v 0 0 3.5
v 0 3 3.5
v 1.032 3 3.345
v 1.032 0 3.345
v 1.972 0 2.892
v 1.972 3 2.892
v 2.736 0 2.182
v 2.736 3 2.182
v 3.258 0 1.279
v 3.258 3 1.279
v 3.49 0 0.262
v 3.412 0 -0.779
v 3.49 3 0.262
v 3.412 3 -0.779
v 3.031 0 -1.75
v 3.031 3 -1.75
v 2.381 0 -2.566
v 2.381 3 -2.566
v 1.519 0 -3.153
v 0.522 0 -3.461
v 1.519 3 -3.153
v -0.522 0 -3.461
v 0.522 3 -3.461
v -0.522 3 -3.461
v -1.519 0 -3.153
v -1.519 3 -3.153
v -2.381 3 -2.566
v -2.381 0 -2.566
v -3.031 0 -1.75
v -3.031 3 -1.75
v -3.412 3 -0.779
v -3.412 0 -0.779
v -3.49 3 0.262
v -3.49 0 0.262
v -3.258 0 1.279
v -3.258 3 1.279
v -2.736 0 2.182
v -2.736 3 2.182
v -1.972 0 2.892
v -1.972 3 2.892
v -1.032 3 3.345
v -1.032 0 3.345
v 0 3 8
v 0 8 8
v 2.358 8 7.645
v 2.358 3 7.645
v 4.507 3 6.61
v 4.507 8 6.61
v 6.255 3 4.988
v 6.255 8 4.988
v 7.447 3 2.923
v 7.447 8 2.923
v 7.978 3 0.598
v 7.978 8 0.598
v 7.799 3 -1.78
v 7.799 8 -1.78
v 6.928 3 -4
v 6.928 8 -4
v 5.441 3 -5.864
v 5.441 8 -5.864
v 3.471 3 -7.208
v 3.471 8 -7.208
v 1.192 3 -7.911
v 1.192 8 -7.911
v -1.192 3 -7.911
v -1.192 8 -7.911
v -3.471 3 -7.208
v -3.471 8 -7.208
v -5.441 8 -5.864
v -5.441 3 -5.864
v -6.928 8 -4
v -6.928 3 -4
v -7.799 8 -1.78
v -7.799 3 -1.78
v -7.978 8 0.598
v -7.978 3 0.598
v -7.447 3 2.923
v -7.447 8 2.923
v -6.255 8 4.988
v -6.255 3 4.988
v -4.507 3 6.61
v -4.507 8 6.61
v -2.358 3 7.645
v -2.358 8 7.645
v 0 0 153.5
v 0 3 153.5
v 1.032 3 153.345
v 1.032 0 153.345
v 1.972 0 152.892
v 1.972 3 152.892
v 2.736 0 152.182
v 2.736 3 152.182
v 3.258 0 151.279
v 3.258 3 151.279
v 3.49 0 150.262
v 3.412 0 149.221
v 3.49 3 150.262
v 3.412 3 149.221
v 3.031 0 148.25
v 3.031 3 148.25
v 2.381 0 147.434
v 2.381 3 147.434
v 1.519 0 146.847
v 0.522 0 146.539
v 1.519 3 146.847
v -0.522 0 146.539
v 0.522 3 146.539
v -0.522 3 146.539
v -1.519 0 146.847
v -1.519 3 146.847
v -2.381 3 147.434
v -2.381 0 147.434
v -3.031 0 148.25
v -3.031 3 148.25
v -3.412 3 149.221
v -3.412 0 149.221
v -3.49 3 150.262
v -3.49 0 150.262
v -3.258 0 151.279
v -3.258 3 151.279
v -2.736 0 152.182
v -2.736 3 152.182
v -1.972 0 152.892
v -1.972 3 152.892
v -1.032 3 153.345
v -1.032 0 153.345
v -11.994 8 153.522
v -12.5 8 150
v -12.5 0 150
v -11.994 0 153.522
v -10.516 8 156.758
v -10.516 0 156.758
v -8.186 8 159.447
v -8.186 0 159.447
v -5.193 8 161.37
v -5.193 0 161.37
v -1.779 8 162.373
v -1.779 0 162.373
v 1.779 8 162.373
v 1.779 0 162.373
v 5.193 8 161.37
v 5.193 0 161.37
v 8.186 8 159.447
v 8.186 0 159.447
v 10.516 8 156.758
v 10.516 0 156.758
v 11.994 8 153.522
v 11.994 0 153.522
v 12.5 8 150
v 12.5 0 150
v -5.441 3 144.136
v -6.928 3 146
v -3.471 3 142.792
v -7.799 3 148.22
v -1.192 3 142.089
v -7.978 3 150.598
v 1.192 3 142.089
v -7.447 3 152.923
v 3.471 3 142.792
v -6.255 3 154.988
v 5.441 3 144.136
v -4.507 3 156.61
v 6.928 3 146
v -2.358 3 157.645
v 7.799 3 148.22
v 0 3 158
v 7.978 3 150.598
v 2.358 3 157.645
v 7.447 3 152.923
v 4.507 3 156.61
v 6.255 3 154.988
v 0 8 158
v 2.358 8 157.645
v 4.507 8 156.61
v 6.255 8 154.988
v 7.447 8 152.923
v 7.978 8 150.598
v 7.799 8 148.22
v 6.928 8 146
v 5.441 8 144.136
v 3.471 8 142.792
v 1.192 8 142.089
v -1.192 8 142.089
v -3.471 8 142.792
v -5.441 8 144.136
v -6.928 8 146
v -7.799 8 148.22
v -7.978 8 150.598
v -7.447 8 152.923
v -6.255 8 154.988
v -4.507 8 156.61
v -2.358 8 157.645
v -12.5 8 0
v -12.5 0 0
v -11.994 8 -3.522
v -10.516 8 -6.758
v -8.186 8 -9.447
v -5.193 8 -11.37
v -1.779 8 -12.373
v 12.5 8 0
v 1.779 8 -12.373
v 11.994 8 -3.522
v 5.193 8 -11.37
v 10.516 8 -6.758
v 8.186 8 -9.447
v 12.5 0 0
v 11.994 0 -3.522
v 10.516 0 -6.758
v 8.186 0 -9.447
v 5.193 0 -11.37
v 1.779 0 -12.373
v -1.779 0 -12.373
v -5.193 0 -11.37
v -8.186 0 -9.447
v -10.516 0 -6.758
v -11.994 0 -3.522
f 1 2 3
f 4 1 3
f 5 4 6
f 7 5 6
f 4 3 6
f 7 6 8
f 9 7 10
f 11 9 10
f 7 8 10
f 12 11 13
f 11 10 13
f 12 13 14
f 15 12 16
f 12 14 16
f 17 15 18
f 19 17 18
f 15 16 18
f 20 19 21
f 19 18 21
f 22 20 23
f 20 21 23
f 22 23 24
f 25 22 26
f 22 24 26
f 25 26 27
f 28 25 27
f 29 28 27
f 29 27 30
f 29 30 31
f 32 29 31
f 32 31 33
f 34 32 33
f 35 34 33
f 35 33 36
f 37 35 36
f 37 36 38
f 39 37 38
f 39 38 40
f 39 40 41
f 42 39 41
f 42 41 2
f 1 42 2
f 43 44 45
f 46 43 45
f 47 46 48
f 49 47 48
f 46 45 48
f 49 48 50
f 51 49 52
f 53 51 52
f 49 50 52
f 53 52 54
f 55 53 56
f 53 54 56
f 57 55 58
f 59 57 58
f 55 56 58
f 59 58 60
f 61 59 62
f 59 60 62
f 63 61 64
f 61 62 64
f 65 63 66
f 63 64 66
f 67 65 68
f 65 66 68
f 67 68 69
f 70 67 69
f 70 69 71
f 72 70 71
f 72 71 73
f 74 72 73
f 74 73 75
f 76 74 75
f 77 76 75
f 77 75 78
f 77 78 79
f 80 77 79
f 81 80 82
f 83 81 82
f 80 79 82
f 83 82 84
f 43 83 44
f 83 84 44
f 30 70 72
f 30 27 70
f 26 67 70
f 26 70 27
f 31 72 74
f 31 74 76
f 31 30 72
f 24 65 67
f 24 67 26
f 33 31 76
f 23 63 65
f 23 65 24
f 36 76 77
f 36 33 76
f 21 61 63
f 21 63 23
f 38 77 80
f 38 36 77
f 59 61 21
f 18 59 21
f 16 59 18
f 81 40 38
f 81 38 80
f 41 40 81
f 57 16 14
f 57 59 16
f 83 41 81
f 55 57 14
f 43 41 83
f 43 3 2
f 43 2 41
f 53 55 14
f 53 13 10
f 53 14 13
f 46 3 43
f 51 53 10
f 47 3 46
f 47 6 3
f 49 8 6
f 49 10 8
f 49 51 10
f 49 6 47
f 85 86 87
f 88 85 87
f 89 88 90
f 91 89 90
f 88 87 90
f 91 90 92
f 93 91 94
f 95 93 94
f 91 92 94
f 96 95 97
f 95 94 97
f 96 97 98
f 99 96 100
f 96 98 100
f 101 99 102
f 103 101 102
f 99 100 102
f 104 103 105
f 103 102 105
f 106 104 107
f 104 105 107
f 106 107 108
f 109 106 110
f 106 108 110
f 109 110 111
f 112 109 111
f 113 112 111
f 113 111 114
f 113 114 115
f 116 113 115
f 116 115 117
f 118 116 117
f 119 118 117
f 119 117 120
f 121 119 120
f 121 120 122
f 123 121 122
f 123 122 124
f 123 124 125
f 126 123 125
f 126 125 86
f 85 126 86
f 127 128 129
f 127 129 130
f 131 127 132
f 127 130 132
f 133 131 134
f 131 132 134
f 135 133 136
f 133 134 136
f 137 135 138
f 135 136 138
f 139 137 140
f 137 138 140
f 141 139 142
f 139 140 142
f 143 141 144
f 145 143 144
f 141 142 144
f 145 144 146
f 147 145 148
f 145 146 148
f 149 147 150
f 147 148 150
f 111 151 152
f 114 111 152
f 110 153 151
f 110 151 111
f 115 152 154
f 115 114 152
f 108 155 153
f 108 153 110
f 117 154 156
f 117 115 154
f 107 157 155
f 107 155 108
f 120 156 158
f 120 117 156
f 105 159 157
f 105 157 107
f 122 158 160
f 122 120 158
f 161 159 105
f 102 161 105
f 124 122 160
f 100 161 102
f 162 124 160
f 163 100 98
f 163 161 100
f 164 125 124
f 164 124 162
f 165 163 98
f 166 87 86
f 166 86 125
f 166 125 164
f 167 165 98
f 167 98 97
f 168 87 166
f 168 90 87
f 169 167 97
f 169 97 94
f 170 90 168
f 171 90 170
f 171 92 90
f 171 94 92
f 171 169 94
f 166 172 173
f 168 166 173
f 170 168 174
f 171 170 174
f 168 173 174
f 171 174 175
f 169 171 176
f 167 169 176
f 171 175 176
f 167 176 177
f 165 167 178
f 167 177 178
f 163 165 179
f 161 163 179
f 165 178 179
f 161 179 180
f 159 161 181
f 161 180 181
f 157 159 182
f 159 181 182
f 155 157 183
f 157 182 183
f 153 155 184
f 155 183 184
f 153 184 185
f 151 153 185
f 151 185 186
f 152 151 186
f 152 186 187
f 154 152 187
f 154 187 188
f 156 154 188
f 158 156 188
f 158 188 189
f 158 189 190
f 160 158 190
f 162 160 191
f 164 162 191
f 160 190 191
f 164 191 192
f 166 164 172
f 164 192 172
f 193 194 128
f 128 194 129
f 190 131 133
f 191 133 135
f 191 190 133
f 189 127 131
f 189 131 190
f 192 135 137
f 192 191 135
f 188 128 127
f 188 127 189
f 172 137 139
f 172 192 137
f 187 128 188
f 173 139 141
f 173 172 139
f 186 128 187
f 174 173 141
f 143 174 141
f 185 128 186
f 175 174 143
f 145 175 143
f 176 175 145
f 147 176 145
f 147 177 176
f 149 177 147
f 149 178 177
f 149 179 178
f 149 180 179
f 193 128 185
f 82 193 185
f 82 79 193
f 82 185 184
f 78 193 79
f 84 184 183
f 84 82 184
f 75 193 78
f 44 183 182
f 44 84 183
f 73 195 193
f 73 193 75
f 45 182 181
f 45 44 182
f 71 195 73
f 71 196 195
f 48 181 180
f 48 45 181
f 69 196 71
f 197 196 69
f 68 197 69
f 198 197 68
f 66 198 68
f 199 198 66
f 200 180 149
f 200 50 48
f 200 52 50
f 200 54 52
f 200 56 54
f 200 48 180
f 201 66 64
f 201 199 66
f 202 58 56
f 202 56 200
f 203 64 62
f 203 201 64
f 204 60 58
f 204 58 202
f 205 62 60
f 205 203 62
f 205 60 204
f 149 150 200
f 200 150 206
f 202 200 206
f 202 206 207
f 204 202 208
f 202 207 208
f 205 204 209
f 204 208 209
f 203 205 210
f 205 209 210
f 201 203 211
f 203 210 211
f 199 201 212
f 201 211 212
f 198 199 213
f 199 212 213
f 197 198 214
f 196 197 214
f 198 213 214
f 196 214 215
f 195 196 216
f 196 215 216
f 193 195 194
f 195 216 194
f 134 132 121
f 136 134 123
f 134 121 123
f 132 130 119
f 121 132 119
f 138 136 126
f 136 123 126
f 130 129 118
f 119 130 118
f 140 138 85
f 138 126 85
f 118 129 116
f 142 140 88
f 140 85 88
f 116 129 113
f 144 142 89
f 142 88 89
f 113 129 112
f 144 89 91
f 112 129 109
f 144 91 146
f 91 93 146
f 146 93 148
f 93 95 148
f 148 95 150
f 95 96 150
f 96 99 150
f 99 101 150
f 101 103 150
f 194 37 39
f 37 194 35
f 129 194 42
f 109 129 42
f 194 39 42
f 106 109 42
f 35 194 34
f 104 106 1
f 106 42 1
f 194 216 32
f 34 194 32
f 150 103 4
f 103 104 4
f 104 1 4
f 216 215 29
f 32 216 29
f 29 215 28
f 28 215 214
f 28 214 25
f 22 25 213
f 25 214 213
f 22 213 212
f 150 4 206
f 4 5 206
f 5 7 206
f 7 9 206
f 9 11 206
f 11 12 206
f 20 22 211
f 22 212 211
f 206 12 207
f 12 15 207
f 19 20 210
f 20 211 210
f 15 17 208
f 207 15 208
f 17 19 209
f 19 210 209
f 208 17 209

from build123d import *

# Parameters (mm, degrees)
BOSS_EXTRUDE1_DEPTH = 8
SKETCH2_R           = 8
CUT_EXTRUDE1_DEPTH  = 5
SKETCH3_R           = 3.5
CUT_EXTRUDE2_DEPTH  = 164.176285042
SKETCH4_R           = 8
CUT_EXTRUDE3_DEPTH  = 5
SKETCH5_R           = 3.5
CUT_EXTRUDE4_DEPTH  = 164.176285042


with BuildPart() as part:
    # Sketch1 → Boss-Extrude1 (new body)
    with BuildSketch(Plane(origin=(0, 0, 0), x_dir=(1, 0, 0), z_dir=(0, 1, 0))):
        with BuildLine():
            Line((-12.5, 0), (-12.5, -150))
            ThreePointArc((-12.5, -150), (0, -162.5), (12.5, -150))
            Line((12.5, -150), (12.5, 0))
            ThreePointArc((12.5, 0), (0, 12.5), (-12.5, 0))
        make_face()
    extrude(amount=BOSS_EXTRUDE1_DEPTH)

    # Sketch2 → Cut-Extrude1 (cut)
    with BuildSketch(Plane(origin=(0, 8, 0), x_dir=(1, 0, 0), z_dir=(0, 1, 0))):
        with Locations(Location((0, 0, 0), (0, 0, 270))):
            Circle(SKETCH2_R)
    extrude(amount=-CUT_EXTRUDE1_DEPTH, mode=Mode.SUBTRACT)

    # Sketch3 → Cut-Extrude2 (cut, through all)
    with BuildSketch(Plane(origin=(0, 8, 0), x_dir=(1, 0, 0), z_dir=(0, 1, 0))):
        with Locations(Location((0, 0, 0), (0, 0, 270))):
            Circle(SKETCH3_R)
    extrude(amount=-CUT_EXTRUDE2_DEPTH, mode=Mode.SUBTRACT)

    # Sketch4 → Cut-Extrude3 (cut)
    with BuildSketch(Plane(origin=(0, 8, 0), x_dir=(1, 0, 0), z_dir=(0, 1, 0))):
        with Locations(Location((0, -150, 0), (0, 0, 270))):
            Circle(SKETCH4_R)
    extrude(amount=-CUT_EXTRUDE3_DEPTH, mode=Mode.SUBTRACT)

    # Sketch5 → Cut-Extrude4 (cut, through all)
    with BuildSketch(Plane(origin=(0, 8, 0), x_dir=(1, 0, 0), z_dir=(0, 1, 0))):
        with Locations(Location((0, -150, 0), (0, 0, 270))):
            Circle(SKETCH5_R)
    extrude(amount=-CUT_EXTRUDE4_DEPTH, mode=Mode.SUBTRACT)


solid = part.part
